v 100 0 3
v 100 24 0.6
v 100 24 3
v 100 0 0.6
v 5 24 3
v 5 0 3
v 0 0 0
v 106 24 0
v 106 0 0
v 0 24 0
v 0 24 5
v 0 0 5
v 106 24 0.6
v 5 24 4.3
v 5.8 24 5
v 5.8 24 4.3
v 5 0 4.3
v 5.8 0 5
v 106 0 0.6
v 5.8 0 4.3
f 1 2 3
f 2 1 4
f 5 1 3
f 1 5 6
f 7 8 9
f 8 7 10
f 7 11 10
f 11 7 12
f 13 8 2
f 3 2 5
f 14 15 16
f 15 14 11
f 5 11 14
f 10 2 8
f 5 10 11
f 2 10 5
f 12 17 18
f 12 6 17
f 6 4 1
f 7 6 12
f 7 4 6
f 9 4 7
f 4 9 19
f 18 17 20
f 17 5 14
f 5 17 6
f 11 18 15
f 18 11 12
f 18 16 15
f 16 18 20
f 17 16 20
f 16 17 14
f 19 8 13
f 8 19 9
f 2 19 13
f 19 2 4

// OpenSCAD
/* Bag clip with living hinge - PETG, 0.4mm nozzle, no supports
   Printed open flat (single print, fuses into one piece), folds shut on 2mm folded bag.
   Two verification parts (lower + upper) that fuse at hinge when printed together.
   Assembly shows closed on bag, motion "closing" folds upper onto lower/bag.
*/
/* [Print] */
part = "lower"; // [lower, upper, assembly]

cadverify_only = "";
module instance(name, part, unit = 1) {
    echo(cadverify_instance = [name, part, unit]);
    if (cadverify_only == "" || cadverify_only == name) children();
}

// ---- parameters (mm) ----
arm_len = 100;
arm_w = 24;
arm_t = 3;
hinge_len = 6;
hinge_t = 0.6;
tab_len = 12;
heel_len = 8;
catch_w = 5;
lip = 0.8;
lip_t = 0.7;
bag_t = 2;

lower_xmax = 106;      // 0..106
upper_len_print = 112; // 0..112
closed_h = 8.2;
pivot_x = 103.05;
pivot_z = 4.1;

module lower_geo() {
    // base
    cube([100, arm_w, arm_t]);
    // catch block at free end (x 0..5), overlap into base
    translate([0, 0, 2.98]) cube([5, arm_w, 2.02]);
    // catch lip protruding +x, overlap into block
    translate([4.98, 0, 4.3]) cube([0.82, arm_w, 0.7]);
    // living hinge leaf, overlap into base
    translate([99.98, 0, 0]) cube([6.02, arm_w, hinge_t]);
}

module upper_geo() {
    // base 0..100
    cube([100, arm_w, arm_t]);
    // heel at hinge end on top
    translate([0, 0, 2.98]) cube([8, arm_w, 2.02]);
    // hook leg near free end on top
    translate([92.2, 0, 2.98]) cube([2, arm_w, 1.82]);
    // hook lip protruding +x from leg side
    translate([94.18, 0, 4.1]) cube([0.82, arm_w, 0.7]);
    // thumb tab extension beyond free end
    translate([99.98, 0, 0]) cube([12.02, arm_w, arm_t]);
}

module bag_geo() {
    translate([8, 0, 3]) cube([84, arm_w, bag_t]);
}

if (part == "lower") {
    echo(cadverify_spec = [
        ["bounds", [[0, 0, 0], [106, 24, 5]]],
        ["bodies", 1],
        ["through_holes", 0],
        ["support_faces", [["bed", "-z", 500]]],
        ["overhangs_allowed", [["catch lip bridge", [[4.5, 0, 4.0], [6.2, 24, 5.1]]]]],
        ["copies", 1],
        ["details", [
            ["base", "material", [[10, 0, 0], [90, 24, 3]], 1],
            ["catch", "material", [[0, 0, 3], [5, 24, 5]], 1],
            ["catch_lip", "material", [[5.0, 0.1, 4.35], [5.75, 23.9, 4.95]], 0.9],
            ["hinge", "material", [[100.05, 0.1, 0.05], [105.95, 23.9, 0.55]], 0.9],
            ["hook_space", "void", [[5.8, 0, 3], [8.6, 24, 5.4]], 1],
            ["bag_space", "void", [[8, 0, 5.1], [92, 24, 7]], 1],
            ["wall", "thickness", [50, 12, 6], [0, 0, -1], 3],
            ["film", "thickness", [103, 12, 2], [0, 0, -1], 0.6],
            ["hinge_top", "view", [[99, 0, 0], [107, 24, 1]]]
        ]]
    ]);
    lower_geo();
} else if (part == "upper") {
    echo(cadverify_spec = [
        ["bounds", [[0, 0, 0], [112, 24, 5]]],
        ["bodies", 1],
        ["through_holes", 0],
        ["support_faces", [["bed", "-z", 500]]],
        ["overhangs_allowed", [["hook lip bridge", [[91.5, 0, 2.8], [96, 24, 5]]]]],
        ["copies", 1],
        ["details", [
            ["heel", "material", [[0, 0, 3], [8, 24, 5]], 1],
            ["arm", "material", [[10, 0, 0], [80, 24, 3]], 1],
            ["hook_leg", "material", [[92.3, 0.1, 3.05], [94.1, 23.9, 4.75]], 0.9],
            ["hook_lip", "material", [[94.2, 0.1, 4.15], [94.95, 23.9, 4.75]], 0.9],
            ["tab", "material", [[100, 0, 0], [112, 24, 3]], 1],
            ["catch_space", "void", [[95, 0, 3], [99.9, 24, 5]], 1],
            ["wall", "thickness", [50, 12, 6], [0, 0, -1], 3],
            ["heel_wall", "thickness", [4, 12, 7], [0, 0, -1], 5],
            ["thumb", "view", [[99, 0, 0], [113, 24, 3.5]]]
        ]]
    ]);
    upper_geo();
} else if (part == "assembly") {
    echo(cadverify_spec = [
        ["bounds", [[-12, 0, 0], [106, 24, 8.2]]],
        ["support_faces", [["bed", "-z", 1000]]],
        ["motions", [
            ["closing", ["upper"], "rotate", [103.05, 12, 4.1], [0, 1, 0], [0, 180],
                ["flex", [["upper", "lower", 1, "latch snap and heel clearance"]]], ["stops", [0]], ["rests", [0]]]
        ]],
        ["assembly_order", [
            [["lower"], [0, 0, 0]],
            [["bag"], [0, 0, -1]],
            [["upper"], [0, 0, -1], ["flex", [["upper", "lower", 1, "latch snap"]]]]
        ]]
    ]);
    instance("lower", "lower") lower_geo();
    instance("upper", "upper") translate([100, 0, 8.2]) rotate([0, 180, 0]) upper_geo();
    instance("bag", "external") bag_geo();
}
